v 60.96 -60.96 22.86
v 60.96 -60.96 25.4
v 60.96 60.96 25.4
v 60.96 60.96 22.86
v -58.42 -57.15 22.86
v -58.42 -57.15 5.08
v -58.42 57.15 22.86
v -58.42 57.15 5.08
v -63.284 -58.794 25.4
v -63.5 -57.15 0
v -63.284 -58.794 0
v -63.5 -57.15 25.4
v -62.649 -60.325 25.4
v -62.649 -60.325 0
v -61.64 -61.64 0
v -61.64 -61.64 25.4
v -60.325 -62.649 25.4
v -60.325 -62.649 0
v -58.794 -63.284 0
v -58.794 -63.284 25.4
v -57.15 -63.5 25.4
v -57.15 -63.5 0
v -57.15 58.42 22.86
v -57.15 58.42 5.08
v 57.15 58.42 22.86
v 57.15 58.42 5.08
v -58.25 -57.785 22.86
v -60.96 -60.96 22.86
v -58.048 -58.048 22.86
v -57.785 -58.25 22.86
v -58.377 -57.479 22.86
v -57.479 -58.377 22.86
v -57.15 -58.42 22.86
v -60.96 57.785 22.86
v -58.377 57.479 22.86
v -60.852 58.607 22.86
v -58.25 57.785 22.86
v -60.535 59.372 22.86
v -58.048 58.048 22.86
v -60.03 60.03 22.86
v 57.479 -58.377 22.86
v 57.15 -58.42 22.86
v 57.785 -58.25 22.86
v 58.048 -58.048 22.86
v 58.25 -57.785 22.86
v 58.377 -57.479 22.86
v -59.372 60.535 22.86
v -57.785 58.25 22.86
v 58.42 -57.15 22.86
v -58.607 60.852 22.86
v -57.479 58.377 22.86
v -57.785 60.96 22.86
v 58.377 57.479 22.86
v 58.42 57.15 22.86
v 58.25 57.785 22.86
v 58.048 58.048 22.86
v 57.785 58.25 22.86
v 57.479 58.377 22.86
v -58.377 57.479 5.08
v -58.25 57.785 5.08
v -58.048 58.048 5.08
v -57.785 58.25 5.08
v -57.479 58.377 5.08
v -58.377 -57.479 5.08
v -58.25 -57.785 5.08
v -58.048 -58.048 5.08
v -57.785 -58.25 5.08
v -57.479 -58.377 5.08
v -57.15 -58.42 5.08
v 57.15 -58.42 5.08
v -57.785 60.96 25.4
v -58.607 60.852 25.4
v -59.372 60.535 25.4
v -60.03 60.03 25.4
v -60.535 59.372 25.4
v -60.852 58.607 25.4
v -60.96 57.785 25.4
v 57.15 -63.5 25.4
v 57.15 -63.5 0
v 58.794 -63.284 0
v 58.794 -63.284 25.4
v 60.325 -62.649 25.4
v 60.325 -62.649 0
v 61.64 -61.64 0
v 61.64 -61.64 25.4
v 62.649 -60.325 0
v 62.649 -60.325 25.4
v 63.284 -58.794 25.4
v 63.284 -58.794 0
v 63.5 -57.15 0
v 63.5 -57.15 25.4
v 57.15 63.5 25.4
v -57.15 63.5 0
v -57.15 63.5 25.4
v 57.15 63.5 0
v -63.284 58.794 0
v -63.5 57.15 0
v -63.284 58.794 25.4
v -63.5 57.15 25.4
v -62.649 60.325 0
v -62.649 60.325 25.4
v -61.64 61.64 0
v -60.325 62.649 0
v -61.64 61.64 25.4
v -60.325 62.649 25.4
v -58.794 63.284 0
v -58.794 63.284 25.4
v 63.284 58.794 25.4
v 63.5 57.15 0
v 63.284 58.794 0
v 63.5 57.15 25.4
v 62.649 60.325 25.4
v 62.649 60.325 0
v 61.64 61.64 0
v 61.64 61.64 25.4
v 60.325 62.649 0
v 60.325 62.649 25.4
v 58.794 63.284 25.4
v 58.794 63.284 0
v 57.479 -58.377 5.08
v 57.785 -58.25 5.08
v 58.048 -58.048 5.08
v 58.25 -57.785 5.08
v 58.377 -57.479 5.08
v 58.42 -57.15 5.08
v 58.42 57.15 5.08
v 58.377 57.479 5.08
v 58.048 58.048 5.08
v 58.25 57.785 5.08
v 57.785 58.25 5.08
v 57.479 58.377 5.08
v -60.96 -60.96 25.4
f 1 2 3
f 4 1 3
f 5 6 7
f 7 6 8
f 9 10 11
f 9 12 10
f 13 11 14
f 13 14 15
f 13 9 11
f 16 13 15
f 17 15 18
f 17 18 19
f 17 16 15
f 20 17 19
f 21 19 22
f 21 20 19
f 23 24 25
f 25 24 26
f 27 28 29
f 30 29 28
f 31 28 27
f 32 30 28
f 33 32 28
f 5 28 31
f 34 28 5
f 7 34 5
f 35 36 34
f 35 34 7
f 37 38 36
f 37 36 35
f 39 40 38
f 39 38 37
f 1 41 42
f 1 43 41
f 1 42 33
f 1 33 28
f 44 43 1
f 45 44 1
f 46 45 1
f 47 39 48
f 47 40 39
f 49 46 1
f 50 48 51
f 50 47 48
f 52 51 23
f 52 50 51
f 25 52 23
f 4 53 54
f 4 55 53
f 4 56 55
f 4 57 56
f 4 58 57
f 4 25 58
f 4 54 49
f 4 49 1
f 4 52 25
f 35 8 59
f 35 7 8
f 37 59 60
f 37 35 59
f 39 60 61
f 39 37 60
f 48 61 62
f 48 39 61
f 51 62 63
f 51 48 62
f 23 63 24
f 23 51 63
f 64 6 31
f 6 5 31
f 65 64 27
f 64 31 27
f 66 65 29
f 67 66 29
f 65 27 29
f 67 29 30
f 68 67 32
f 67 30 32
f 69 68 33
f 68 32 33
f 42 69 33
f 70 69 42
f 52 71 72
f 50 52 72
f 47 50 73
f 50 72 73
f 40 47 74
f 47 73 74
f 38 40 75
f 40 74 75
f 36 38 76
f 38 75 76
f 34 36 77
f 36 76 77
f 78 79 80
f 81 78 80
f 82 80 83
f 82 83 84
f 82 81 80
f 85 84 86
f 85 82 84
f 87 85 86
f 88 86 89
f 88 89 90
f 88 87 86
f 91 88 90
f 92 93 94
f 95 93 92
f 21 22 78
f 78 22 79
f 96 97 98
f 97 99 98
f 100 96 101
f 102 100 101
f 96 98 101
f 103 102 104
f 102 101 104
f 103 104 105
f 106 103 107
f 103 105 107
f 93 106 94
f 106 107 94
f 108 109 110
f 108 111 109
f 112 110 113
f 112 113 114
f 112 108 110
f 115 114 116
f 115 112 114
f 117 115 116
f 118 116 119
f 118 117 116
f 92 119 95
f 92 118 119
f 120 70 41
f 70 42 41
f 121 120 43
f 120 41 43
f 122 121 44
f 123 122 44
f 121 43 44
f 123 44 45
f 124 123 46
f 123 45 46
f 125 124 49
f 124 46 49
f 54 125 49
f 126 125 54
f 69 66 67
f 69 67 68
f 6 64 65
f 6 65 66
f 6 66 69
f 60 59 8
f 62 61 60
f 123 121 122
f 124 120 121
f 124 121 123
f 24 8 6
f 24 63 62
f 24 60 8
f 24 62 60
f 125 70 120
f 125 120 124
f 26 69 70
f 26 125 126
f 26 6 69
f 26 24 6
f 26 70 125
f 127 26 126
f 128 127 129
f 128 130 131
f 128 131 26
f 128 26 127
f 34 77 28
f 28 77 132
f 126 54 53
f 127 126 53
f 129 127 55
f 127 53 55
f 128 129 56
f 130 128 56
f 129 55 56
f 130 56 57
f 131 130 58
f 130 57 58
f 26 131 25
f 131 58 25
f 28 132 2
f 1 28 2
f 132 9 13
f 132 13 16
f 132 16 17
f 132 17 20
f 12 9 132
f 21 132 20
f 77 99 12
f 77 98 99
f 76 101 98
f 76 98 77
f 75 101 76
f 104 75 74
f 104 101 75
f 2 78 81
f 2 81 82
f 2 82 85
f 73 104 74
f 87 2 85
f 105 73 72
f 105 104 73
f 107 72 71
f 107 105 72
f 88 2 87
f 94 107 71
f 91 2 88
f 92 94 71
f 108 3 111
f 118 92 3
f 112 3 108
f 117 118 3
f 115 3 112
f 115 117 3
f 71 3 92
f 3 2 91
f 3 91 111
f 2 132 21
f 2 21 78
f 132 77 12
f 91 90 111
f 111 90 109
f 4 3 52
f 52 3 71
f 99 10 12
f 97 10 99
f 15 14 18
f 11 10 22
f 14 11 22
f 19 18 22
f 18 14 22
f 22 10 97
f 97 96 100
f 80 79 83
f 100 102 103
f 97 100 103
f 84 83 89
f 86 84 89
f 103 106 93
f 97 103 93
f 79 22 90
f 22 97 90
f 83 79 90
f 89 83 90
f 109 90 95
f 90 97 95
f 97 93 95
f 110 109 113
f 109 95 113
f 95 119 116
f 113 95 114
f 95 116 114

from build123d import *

# Parameters (mm, degrees)
F0_W     = 127
F0_H     = 127
F1_DEPTH = 25.4
F2_R     = 6.35
F3_T     = -5.08
F5_DEPTH = 2.54


with BuildPart() as f1:
    # F0 (on Top) → F1 (new body)
    with BuildSketch(Plane.XY):
        Rectangle(F0_W, F0_H)
    extrude(amount=F1_DEPTH)

    # F2
    f2_edges = [f1.edges().sort_by_distance(p)[0] for p in [
        (63.5, -63.5, 12.7),
        (63.5, 63.5, 12.7),
        (-63.5, 63.5, 12.7),
        (-63.5, -63.5, 12.7),
    ]]
    fillet(f2_edges, radius=F2_R)

    # F3
    f3_openings = [f1.faces().sort_by_distance(p)[0] for p in [
        (0, 0, 25.4),
    ]]
    offset(amount=F3_T, openings=f3_openings)

    # F4 (on face) → F5 (cut)
    with BuildSketch(Plane.XY.offset(25.4)):
        with BuildLine():
            Line((60.96, 60.96), (-57.785, 60.96))
            ThreePointArc((-57.785, 60.96), (-60.030064, 60.030064), (-60.96, 57.785))
            Line((-60.96, 57.785), (-60.96, -60.96))
            Line((-60.96, -60.96), (60.96, -60.96))
            Line((60.96, -60.96), (60.96, 60.96))
        make_face()
    extrude(amount=-F5_DEPTH, mode=Mode.SUBTRACT)


solid = f1.part
